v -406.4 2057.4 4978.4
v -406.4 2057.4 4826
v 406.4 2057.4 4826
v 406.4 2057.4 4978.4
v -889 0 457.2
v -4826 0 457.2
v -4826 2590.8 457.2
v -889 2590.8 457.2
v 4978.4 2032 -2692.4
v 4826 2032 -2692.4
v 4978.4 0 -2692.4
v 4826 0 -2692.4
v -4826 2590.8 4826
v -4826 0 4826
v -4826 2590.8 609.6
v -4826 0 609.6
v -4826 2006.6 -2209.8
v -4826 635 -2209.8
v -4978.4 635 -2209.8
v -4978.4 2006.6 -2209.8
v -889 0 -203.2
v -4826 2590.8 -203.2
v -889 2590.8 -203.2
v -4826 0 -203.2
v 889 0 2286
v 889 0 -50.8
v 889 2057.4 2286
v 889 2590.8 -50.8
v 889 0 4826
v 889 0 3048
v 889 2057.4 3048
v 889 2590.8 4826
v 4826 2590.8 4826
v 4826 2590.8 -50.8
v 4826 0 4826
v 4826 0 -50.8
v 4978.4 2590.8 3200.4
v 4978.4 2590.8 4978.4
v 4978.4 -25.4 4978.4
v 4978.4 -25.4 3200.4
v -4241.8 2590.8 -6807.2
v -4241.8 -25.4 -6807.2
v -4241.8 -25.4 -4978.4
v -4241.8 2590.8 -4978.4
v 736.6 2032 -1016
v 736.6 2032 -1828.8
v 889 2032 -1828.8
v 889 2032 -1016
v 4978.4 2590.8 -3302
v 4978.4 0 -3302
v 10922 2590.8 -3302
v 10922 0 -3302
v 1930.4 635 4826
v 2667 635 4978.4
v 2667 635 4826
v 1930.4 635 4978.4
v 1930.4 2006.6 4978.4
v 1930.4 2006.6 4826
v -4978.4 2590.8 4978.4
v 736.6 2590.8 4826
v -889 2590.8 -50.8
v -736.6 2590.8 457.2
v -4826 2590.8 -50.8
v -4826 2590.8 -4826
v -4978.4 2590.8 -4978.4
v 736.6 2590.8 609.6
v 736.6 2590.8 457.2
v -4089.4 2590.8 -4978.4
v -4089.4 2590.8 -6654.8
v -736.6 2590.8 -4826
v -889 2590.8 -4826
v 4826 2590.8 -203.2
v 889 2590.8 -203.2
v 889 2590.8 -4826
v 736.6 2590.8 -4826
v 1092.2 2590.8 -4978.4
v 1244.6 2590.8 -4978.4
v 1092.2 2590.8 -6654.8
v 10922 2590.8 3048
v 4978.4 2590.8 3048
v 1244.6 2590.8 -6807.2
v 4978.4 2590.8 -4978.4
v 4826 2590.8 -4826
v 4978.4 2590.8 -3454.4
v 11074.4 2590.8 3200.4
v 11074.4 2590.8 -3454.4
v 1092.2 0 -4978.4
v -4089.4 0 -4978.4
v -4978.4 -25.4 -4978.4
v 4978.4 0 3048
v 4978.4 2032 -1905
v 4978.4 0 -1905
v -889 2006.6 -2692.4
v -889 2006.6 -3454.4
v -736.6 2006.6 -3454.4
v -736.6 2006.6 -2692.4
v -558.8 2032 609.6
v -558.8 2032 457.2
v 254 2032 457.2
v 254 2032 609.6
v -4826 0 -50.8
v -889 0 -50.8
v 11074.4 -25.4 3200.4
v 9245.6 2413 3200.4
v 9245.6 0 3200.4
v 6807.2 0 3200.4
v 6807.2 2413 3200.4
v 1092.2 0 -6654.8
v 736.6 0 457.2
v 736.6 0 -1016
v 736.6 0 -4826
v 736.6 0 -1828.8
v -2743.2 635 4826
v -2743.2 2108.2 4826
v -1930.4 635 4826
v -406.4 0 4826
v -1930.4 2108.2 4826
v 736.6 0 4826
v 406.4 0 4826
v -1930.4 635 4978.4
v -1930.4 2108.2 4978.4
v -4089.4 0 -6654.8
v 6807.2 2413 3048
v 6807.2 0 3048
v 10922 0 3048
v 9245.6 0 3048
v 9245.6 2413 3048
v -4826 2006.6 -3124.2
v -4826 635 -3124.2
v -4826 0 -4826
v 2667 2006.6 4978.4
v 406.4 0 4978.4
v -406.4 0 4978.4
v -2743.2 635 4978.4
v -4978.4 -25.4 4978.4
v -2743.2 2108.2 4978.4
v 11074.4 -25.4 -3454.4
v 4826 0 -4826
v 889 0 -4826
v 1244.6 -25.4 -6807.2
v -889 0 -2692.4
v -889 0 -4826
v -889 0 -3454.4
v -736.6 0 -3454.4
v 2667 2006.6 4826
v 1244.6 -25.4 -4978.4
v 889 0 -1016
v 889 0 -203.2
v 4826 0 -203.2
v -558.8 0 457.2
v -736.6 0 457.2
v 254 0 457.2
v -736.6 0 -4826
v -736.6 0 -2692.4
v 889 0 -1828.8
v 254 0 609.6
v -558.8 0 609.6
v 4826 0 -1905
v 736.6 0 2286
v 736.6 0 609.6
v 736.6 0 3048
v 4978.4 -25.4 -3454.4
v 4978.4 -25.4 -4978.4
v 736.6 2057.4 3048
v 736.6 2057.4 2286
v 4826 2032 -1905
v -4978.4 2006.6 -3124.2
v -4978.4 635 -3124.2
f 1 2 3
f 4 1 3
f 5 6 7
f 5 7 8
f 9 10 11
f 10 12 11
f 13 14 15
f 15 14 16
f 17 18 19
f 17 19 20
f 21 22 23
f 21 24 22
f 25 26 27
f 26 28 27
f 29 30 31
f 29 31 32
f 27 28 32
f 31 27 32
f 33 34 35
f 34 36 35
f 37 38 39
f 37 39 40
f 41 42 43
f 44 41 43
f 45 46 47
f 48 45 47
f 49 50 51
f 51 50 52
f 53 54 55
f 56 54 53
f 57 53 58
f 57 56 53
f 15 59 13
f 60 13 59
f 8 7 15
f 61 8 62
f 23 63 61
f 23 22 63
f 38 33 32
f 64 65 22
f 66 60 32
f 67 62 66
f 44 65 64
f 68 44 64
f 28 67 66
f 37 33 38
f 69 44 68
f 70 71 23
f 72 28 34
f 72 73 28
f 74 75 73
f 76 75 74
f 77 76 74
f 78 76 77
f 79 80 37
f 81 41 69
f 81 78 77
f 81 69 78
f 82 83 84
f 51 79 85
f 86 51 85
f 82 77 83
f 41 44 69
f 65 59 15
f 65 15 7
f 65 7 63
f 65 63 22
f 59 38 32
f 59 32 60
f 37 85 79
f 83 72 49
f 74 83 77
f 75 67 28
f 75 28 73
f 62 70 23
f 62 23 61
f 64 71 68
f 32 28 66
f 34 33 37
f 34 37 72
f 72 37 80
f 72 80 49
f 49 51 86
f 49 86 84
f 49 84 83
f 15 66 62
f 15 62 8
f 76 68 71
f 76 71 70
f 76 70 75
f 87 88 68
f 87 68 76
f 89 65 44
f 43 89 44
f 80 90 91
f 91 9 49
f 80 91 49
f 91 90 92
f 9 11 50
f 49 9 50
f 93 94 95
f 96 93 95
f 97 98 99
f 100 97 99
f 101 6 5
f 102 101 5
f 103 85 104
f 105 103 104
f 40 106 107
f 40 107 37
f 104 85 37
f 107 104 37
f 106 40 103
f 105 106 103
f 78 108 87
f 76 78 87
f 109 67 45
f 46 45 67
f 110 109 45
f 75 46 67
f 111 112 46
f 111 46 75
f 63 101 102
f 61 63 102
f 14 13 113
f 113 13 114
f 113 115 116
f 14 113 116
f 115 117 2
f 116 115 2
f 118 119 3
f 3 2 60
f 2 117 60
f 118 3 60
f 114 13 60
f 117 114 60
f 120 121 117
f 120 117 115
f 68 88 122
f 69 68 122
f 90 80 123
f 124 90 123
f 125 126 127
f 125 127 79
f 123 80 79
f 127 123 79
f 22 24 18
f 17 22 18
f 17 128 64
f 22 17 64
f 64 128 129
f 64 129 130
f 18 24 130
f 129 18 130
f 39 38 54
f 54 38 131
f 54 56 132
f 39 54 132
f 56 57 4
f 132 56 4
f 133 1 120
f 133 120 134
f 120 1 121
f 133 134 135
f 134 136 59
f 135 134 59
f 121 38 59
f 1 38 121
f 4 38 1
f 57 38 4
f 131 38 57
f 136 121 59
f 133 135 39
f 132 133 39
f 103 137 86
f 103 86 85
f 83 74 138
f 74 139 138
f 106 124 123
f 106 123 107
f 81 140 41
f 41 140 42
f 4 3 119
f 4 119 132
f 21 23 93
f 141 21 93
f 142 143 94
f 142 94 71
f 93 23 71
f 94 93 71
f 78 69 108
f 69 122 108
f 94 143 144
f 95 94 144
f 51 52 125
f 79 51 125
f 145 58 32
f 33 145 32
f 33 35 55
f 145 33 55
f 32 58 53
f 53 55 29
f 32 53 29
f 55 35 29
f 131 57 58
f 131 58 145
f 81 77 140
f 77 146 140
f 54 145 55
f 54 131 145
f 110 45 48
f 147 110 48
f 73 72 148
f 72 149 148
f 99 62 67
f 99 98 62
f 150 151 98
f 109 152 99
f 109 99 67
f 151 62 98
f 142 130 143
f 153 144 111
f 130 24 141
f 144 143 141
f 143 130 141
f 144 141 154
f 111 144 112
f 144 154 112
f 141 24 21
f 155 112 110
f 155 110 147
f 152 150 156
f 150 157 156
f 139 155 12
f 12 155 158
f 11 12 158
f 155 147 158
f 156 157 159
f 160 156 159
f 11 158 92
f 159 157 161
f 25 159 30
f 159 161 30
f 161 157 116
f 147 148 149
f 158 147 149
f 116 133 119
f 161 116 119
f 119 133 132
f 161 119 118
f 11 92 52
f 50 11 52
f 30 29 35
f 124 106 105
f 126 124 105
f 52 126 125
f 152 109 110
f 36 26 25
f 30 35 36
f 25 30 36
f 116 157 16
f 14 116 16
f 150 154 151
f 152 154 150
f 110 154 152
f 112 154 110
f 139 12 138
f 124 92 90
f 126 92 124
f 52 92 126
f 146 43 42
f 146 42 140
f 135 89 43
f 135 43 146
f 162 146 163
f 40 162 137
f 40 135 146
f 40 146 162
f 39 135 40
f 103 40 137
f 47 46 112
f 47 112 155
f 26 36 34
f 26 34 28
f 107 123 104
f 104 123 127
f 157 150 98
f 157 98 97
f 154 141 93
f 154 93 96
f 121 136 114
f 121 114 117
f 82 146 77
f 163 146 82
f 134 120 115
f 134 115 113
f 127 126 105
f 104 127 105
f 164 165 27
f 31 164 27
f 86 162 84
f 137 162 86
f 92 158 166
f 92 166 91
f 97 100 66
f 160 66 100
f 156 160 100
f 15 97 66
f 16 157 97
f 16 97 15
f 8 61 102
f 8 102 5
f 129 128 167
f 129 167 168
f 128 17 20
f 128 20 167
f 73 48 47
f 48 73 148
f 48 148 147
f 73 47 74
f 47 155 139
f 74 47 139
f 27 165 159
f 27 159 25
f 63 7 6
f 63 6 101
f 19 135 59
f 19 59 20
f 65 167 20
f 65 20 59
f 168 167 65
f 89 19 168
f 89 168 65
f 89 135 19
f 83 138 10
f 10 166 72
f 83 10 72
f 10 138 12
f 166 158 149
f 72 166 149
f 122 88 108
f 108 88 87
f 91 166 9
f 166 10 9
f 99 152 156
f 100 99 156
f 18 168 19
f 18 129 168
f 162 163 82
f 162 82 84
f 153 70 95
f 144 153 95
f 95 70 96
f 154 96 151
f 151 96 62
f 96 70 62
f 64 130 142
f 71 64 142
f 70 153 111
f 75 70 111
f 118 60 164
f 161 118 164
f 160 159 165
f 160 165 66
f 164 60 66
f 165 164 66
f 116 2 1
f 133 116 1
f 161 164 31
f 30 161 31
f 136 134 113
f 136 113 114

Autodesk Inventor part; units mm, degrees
ref_plane "YZ Plane" through (0, 0, 0) normal (1, 0, 0) x (0, 1, 0)
ref_plane "XZ Plane" through (0, 0, 0) normal (0, 1, 0) x (-1, 0, 0)
ref_plane "XY Plane" through (0, 0, 0) normal (0, 0, 1) x (1, 0, 0)
sketch "Sketch1" plane through (0, 0, 0) normal (0, 1, 0) x (-1, 0, 0)
  line L0 (4978.4, 4978.4) -> (4978.4, -4978.4)
  line L1 (8188.96, 0) -> (-14284.96, 0) projected
  line L2 (0, -9164.32) -> (0, 7335.52) projected
  line L3 (-4978.4, -3454.4) -> (-11074.4, -3454.4)
  line L4 (-11074.4, -3454.4) -> (-11074.4, 3200.4)
  line L5 (-4978.4, -3302) -> (-10922, -3302)
  line L6 (-10922, -3302) -> (-10922, 3048)
  line L7 (4089.4, -4978.4) -> (-1092.2, -4978.4)
  line L8 (-1244.6, -4978.4) -> (-1244.6, -6807.2)
  line L9 (-1244.6, -6807.2) -> (4241.8, -6807.2)
  line L10 (4241.8, -6807.2) -> (4241.8, -4978.4)
  line L11 (4089.4, -6654.8) -> (-1092.2, -6654.8)
  line L12 (-1092.2, -6654.8) -> (-1092.2, -4978.4)
  line L13 (-1092.2, -4978.4) -> (4089.4, -4978.4)
  line L14 (4089.4, -4978.4) -> (4089.4, -6654.8)
  line L15 (-1244.6, -4978.4) -> (-4978.4, -4978.4)
  line L16 (4978.4, -4978.4) -> (4241.8, -4978.4)
  line L17 (4089.4, -4978.4) -> (-1092.2, -4978.4)
  line L18 (-4978.4, -4978.4) -> (-4978.4, -3454.4)
  line L19 (-4978.4, 3200.4) -> (-4978.4, 4978.4)
  line L20 (-6807.2, 3048) -> (-6807.2, 3200.4)
  line L21 (-9245.6, 3048) -> (-9245.6, 3200.4)
  line L22 (-10922, 3048) -> (-9245.6, 3048)
  line L23 (-6807.2, 3048) -> (-4978.4, 3048)
  line L24 (-11074.4, 3200.4) -> (-9245.6, 3200.4)
  line L25 (-6807.2, 3200.4) -> (-4978.4, 3200.4)
  line L26 (-406.4, 4826) -> (-406.4, 4978.4)
  line L27 (406.4, 4826) -> (406.4, 4978.4)
  line L28 (-4978.4, 4978.4) -> (-406.4, 4978.4)
  line L29 (406.4, 4978.4) -> (4978.4, 4978.4)
  line L30 (406.4, 4826) -> (4826, 4826)
  line L31 (4826, -203.2) -> (889, -203.2)
  line L32 (4826, -50.8) -> (889, -50.8)
  line L33 (-4826, -203.2) -> (-889, -203.2)
  line L34 (-4826, -50.8) -> (-889, -50.8)
  line L35 (-4826, -1905) -> (-4978.4, -1905)
  line L36 (-4826, -2692.4) -> (-4978.4, -2692.4)
  line L37 (-4978.4, 3048) -> (-4978.4, -1905)
  line L38 (-4978.4, -2692.4) -> (-4978.4, -3302)
  line L39 (-4978.4, 3048) -> (-4978.4, -1905)
  line L40 (-4978.4, -2692.4) -> (-4978.4, -3302)
  line L41 (-4826, -4826) -> (-4826, -2692.4)
  line L42 (-4978.4, -3302) -> (-4978.4, -2692.4)
  line L43 (-4978.4, -1905) -> (-4978.4, 3048)
  line L44 (-4826, -1905) -> (-4826, -203.2)
  line L45 (-4826, -50.8) -> (-4826, 4826)
  line L46 (-4826, 4826) -> (-889, 4826)
  line L47 (-736.6, 4826) -> (-406.4, 4826)
  line L48 (4826, -203.2) -> (4826, -4826)
  line L49 (4826, -4826) -> (889, -4826)
  line L50 (736.6, -4826) -> (-736.6, -4826)
  line L51 (-889, -4826) -> (-4826, -4826)
  line L52 (889, -2692.4) -> (736.6, -2692.4)
  line L53 (889, -3454.4) -> (736.6, -3454.4)
  line L54 (-736.6, -1016) -> (-889, -1016)
  line L55 (-736.6, -1828.8) -> (-889, -1828.8)
  line L56 (-254, 457.2) -> (-254, 609.6)
  line L57 (558.8, 609.6) -> (4826, 609.6)
  line L58 (736.6, -50.8) -> (736.6, 457.2)
  line L59 (889, -50.8) -> (889, 457.2)
  line L60 (-736.6, 3048) -> (-889, 3048)
  line L61 (-736.6, 2286) -> (-889, 2286)
  line L62 (558.8, 457.2) -> (558.8, 609.6)
  line L63 (-254, 609.6) -> (-736.6, 609.6)
  line L64 (-736.6, 457.2) -> (-254, 457.2)
  line L65 (-736.6, -50.8) -> (-736.6, 457.2)
  line L66 (4826, 457.2) -> (889, 457.2)
  line L67 (736.6, 457.2) -> (558.8, 457.2)
  line L68 (-736.6, 609.6) -> (-736.6, 2286)
  line L69 (-736.6, 3048) -> (-736.6, 4826)
  line L70 (-889, -50.8) -> (-889, 2286)
  line L71 (-889, 3048) -> (-889, 4826)
  line L72 (-736.6, -50.8) -> (-736.6, -1016)
  line L73 (-736.6, -1828.8) -> (-736.6, -4826)
  line L74 (-889, -203.2) -> (-889, -1016)
  line L75 (-889, -1828.8) -> (-889, -4826)
  line L76 (736.6, -50.8) -> (736.6, -2692.4)
  line L77 (736.6, -3454.4) -> (736.6, -4826)
  line L78 (889, -203.2) -> (889, -2692.4)
  line L79 (889, -3454.4) -> (889, -4826)
  line L80 (4826, 4826) -> (4826, 609.6)
  line L81 (4826, 457.2) -> (4826, -50.8)
  point P0 (0, 0)
  dimension "d8" = 152.4
  dimension "d9" = 152.4
  dimension "d12" = 736.6
  dimension "d14" = 152.4
  dimension "d15" = 152.4
  dimension "d16" = 152.4
  dimension "d17" = 1828.8
  dimension "d19" = 1524
  dimension "d22" = 9956.8
  dimension "d23" = 3733.8
  dimension "d24" = 1828.8
  dimension "d25" = 1828.8
  dimension "d26" = 6654.8
  dimension "d27" = 152.4
  dimension "d28" = 4572
  dimension "d29" = 812.8
  dimension "d30" = 9956.8
  dimension "d32" = 152.4
  dimension "d35" = 1701.8
  dimension "d36" = 2489.2
  dimension "d38" = 5486.4
  dimension "d40" = 152.4
  dimension "d41" = 4622.8
  dimension "d42" = 152.4
  dimension "d43" = 6096
  dimension "d44" = 2489.2
  dimension "d45" = 3251.2
  dimension "d48" = 812.8
  dimension "d49" = 812.8
  dimension "d52" = 1778
  dimension "d53" = 2540
  dimension "d57" = 812.8
  dimension "d59" = 152.4
  dimension "d60" = 152.4
  dimension "d61" = 152.4
  dimension "d62" = 5283.2
  dimension "d63" = 3937
  dimension "d64" = 4267.2
  dimension "d65" = 152.4
extrude "Extrusion1" add sketch "Sketch1" along normal blind 2590.8 contours L0 L1 L81 L66 L59 L58 L67 L62 L57 L80 L30 L27 L29 | L0 L16 L10 L9 L2 L11 L14 L7 L50 L77 L53 L79 L49 L48 L31 L78 L52 L76 L58 L1 L59 L32 L81 | L9 L8 L15 L18 L3 L4 L1 L6 L5 L38 L36 L41 L51 L75 L55 L73 L50 L2 L7 L12 L11 | L65 L72 L54 L74 L33 L44 L35 L37 L1 L45 L34 L70 | L1 L70 L61 L68 L63 L56 L64 L65 | L1 L37 L23 L20 L25 L19 L28 L26 L47 L69 L60 L71 L46 L45 | L1 L4 L24 L21 L22 L6
sketch "Sketch2" plane through (0, 0, 0) normal (0, -1, 0) x (1, 0, 0)
  line L0 (-4978.4, -4978.4) -> (-4978.4, 4978.4) projected
  line L1 (-4241.8, -4978.4) -> (-4978.4, -4978.4) projected
  line L2 (-4241.8, -6807.2) -> (-4241.8, -4978.4) projected
  line L3 (1244.6, -6807.2) -> (-4241.8, -6807.2) projected
  line L4 (1244.6, -4978.4) -> (1244.6, -6807.2) projected
  line L5 (4978.4, -4978.4) -> (1244.6, -4978.4) projected
  line L6 (4978.4, -3454.4) -> (4978.4, -4978.4) projected
  line L7 (11074.4, -3454.4) -> (4978.4, -3454.4) projected
  line L8 (11074.4, 3200.4) -> (11074.4, -3454.4) projected
  line L9 (9245.6, 3200.4) -> (11074.4, 3200.4) projected
  line L10 (9245.6, 3048) -> (9245.6, 3200.4) projected
  line L11 (10922, 3048) -> (9245.6, 3048) projected
  line L12 (10922, -3302) -> (10922, 3048) projected
  line L13 (4978.4, -3302) -> (10922, -3302) projected
  line L14 (4978.4, -2692.4) -> (4978.4, -3302) projected
  line L15 (4826, -2692.4) -> (4978.4, -2692.4) projected
  line L16 (4826, -4826) -> (4826, -2692.4) projected
  line L17 (889, -4826) -> (4826, -4826) projected
  line L18 (889, -1828.8) -> (889, -4826) projected
  line L19 (736.6, -1828.8) -> (889, -1828.8) projected
  line L20 (736.6, -4826) -> (736.6, -1828.8) projected
  line L21 (-736.6, -4826) -> (736.6, -4826) projected
  line L22 (-736.6, -3454.4) -> (-736.6, -4826) projected
  line L23 (-889, -3454.4) -> (-736.6, -3454.4) projected
  line L24 (-889, -4826) -> (-889, -3454.4) projected
  line L25 (-4826, -4826) -> (-889, -4826) projected
  line L26 (-4826, -203.2) -> (-4826, -4826) projected
  line L27 (-889, -203.2) -> (-4826, -203.2) projected
  line L28 (-889, -2692.4) -> (-889, -203.2) projected
  line L29 (-736.6, -2692.4) -> (-889, -2692.4) projected
  line L30 (-736.6, 457.2) -> (-736.6, -2692.4) projected
  line L31 (-558.8, 457.2) -> (-736.6, 457.2) projected
  line L32 (-558.8, 609.6) -> (-558.8, 457.2) projected
  line L33 (-4826, 609.6) -> (-558.8, 609.6) projected
  line L34 (-4826, 4826) -> (-4826, 609.6) projected
  line L35 (-406.4, 4826) -> (-4826, 4826) projected
  line L36 (-406.4, 4978.4) -> (-406.4, 4826) projected
  line L37 (-4978.4, 4978.4) -> (-406.4, 4978.4) projected
  line L38 (4978.4, 4978.4) -> (4978.4, 3200.4) projected
  line L39 (406.4, 4978.4) -> (4978.4, 4978.4) projected
  line L40 (406.4, 4826) -> (406.4, 4978.4) projected
  line L41 (736.6, 4826) -> (406.4, 4826) projected
  line L42 (736.6, 3048) -> (736.6, 4826) projected
  line L43 (889, 3048) -> (736.6, 3048) projected
  line L44 (889, 4826) -> (889, 3048) projected
  line L45 (4826, 4826) -> (889, 4826) projected
  line L46 (4826, -50.8) -> (4826, 4826) projected
  line L47 (889, -50.8) -> (4826, -50.8) projected
  line L48 (889, 2286) -> (889, -50.8) projected
  line L49 (736.6, 2286) -> (889, 2286) projected
  line L50 (736.6, 609.6) -> (736.6, 2286) projected
  line L51 (254, 609.6) -> (736.6, 609.6) projected
  line L52 (254, 457.2) -> (254, 609.6) projected
  line L53 (736.6, 457.2) -> (254, 457.2) projected
  line L54 (736.6, -1016) -> (736.6, 457.2) projected
  line L55 (889, -1016) -> (736.6, -1016) projected
  line L56 (889, -203.2) -> (889, -1016) projected
  line L57 (4826, -203.2) -> (889, -203.2) projected
  line L58 (4826, -1905) -> (4826, -203.2) projected
  line L59 (4978.4, -1905) -> (4826, -1905) projected
  line L60 (4978.4, 3048) -> (4978.4, -1905) projected
  line L61 (6807.2, 3048) -> (4978.4, 3048) projected
  line L62 (6807.2, 3200.4) -> (6807.2, 3048) projected
  line L63 (4978.4, 3200.4) -> (6807.2, 3200.4) projected
  line L64 (-4978.4, 4978.4) -> (4978.4, 4978.4)
  line L65 (4978.4, 4978.4) -> (4978.4, -4978.4)
  line L66 (4978.4, -4978.4) -> (-4978.4, -4978.4)
  line L67 (-4978.4, -4978.4) -> (-4978.4, 4978.4)
  line L68 (-4241.8, -4978.4) -> (1244.6, -4978.4)
  line L69 (1244.6, -4978.4) -> (1244.6, -6807.2)
  line L70 (1244.6, -6807.2) -> (-4241.8, -6807.2)
  line L71 (-4241.8, -6807.2) -> (-4241.8, -4978.4)
  line L72 (11074.4, 3200.4) -> (4978.4, 3200.4)
  line L73 (4978.4, 3200.4) -> (4978.4, -3454.4)
  line L74 (4978.4, -3454.4) -> (11074.4, -3454.4)
  line L75 (11074.4, -3454.4) -> (11074.4, 3200.4)
  point P0 (0, 0)
extrude "Extrusion2" add sketch "Sketch2" along normal blind 25.4
sketch "Sketch3" plane through (0, 2590.8, 0) normal (0, 1, 0) x (1, 0, 0)
  line L0 (6807.2, -3200.4) -> (6807.2, -3048) projected
  line L1 (9245.6, -3200.4) -> (6807.2, -3200.4) projected
  line L2 (9245.6, -3048) -> (9245.6, -3200.4) projected
  line L3 (10922, -3048) -> (9245.6, -3048) projected
  line L4 (10922, 3302) -> (10922, -3048) projected
  line L5 (4978.4, 3302) -> (10922, 3302) projected
  line L6 (4978.4, 2692.4) -> (4978.4, 3302) projected
  line L7 (4826, 2692.4) -> (4978.4, 2692.4) projected
  line L8 (4826, 4826) -> (4826, 2692.4) projected
  line L9 (889, 4826) -> (4826, 4826) projected
  line L10 (889, 1828.8) -> (889, 4826) projected
  line L11 (736.6, 1828.8) -> (889, 1828.8) projected
  line L12 (736.6, 4826) -> (736.6, 1828.8) projected
  line L13 (-736.6, 4826) -> (736.6, 4826) projected
  line L14 (-736.6, 3454.4) -> (-736.6, 4826) projected
  line L15 (-889, 3454.4) -> (-736.6, 3454.4) projected
  line L16 (-889, 4826) -> (-889, 3454.4) projected
  line L17 (-4826, 4826) -> (-889, 4826) projected
  line L18 (-4826, 203.2) -> (-4826, 4826) projected
  line L19 (-889, 203.2) -> (-4826, 203.2) projected
  line L20 (-889, 2692.4) -> (-889, 203.2) projected
  line L21 (-736.6, 2692.4) -> (-889, 2692.4) projected
  line L22 (-736.6, -457.2) -> (-736.6, 2692.4) projected
  line L23 (-558.8, -457.2) -> (-736.6, -457.2) projected
  line L24 (-558.8, -609.6) -> (-558.8, -457.2) projected
  line L25 (-4826, -609.6) -> (-558.8, -609.6) projected
  line L26 (-4826, -4826) -> (-4826, -609.6) projected
  line L27 (-406.4, -4826) -> (-4826, -4826) projected
  line L28 (-406.4, -4978.4) -> (-406.4, -4826) projected
  line L29 (406.4, -4978.4) -> (-406.4, -4978.4) projected
  line L30 (406.4, -4826) -> (406.4, -4978.4) projected
  line L31 (736.6, -4826) -> (406.4, -4826) projected
  line L32 (736.6, -3048) -> (736.6, -4826) projected
  line L33 (889, -3048) -> (736.6, -3048) projected
  line L34 (889, -4826) -> (889, -3048) projected
  line L35 (4826, -4826) -> (889, -4826) projected
  line L36 (4826, 50.8) -> (4826, -4826) projected
  line L37 (889, 50.8) -> (4826, 50.8) projected
  line L38 (889, -2286) -> (889, 50.8) projected
  line L39 (736.6, -2286) -> (889, -2286) projected
  line L40 (736.6, -609.6) -> (736.6, -2286) projected
  line L41 (254, -609.6) -> (736.6, -609.6) projected
  line L42 (254, -457.2) -> (254, -609.6) projected
  line L43 (736.6, -457.2) -> (254, -457.2) projected
  line L44 (736.6, 1016) -> (736.6, -457.2) projected
  line L45 (889, 1016) -> (736.6, 1016) projected
  line L46 (889, 203.2) -> (889, 1016) projected
  line L47 (4826, 203.2) -> (889, 203.2) projected
  line L48 (4826, 1905) -> (4826, 203.2) projected
  line L49 (4978.4, 1905) -> (4826, 1905) projected
  line L50 (4978.4, -3048) -> (4978.4, 1905) projected
  line L51 (6807.2, -3048) -> (4978.4, -3048) projected
  line L52 (-406.4, -4826) -> (406.4, -4826)
  line L53 (406.4, -4826) -> (406.4, -4978.4)
  line L54 (406.4, -4978.4) -> (-406.4, -4978.4)
  line L55 (-406.4, -4978.4) -> (-406.4, -4826)
  line L56 (736.6, -2286) -> (889, -2286)
  line L57 (889, -2286) -> (889, -3048)
  line L58 (889, -3048) -> (736.6, -3048)
  line L59 (736.6, -3048) -> (736.6, -2286)
  line L60 (-558.8, -457.2) -> (254, -457.2)
  line L61 (254, -457.2) -> (254, -609.6)
  line L62 (254, -609.6) -> (-558.8, -609.6)
  line L63 (-558.8, -609.6) -> (-558.8, -457.2)
  line L64 (736.6, 1828.8) -> (889, 1828.8)
  line L65 (889, 1828.8) -> (889, 1016)
  line L66 (889, 1016) -> (736.6, 1016)
  line L67 (736.6, 1016) -> (736.6, 1828.8)
  line L68 (-889, 3454.4) -> (-736.6, 3454.4)
  line L69 (-736.6, 3454.4) -> (-736.6, 2692.4)
  line L70 (-736.6, 2692.4) -> (-889, 2692.4)
  line L71 (-889, 2692.4) -> (-889, 3454.4)
  line L72 (4826, 2692.4) -> (4978.4, 2692.4)
  line L73 (4978.4, 2692.4) -> (4978.4, 1905)
  line L74 (4978.4, 1905) -> (4826, 1905)
  line L75 (4826, 1905) -> (4826, 2692.4)
  line L76 (6807.2, -3048) -> (9245.6, -3048)
  line L77 (9245.6, -3048) -> (9245.6, -3200.4)
  line L78 (9245.6, -3200.4) -> (6807.2, -3200.4)
  line L79 (6807.2, -3200.4) -> (6807.2, -3048)
  point P0 (0, 0)
extrude "Extrusion3" add sketch "Sketch3" against normal blind 558.8 contours L49 L75 L7 L73 | L45 L67 L11 L65 | L42 L62 L24 L60
extrude "Extrusion4" add sketch "Sketch3" against normal blind 533.4 contours L39 L57 L33 L59
extrude "Extrusion5" add sketch "Sketch3" against normal blind 584.2 contours L69 L21 L71 L15
extrude "Extrusion6" add sketch "Sketch3" against normal blind 177.8 contours L0 L76 L2 L1
extrude "Extrusion7" add sketch "Sketch3" against normal blind 533.4 contours L52 L30 L29 L28
sketch "Sketch4" plane through (-4978.4, 2590.8, 4978.4) normal (0, 0, 1) x (1, 0, 0)
  line L0 (0, 0) -> (9956.8, 0) projected
  line L1 (0, -2616.2) -> (0, 0) projected
  line L2 (9956.8, 0) -> (9956.8, -2616.2) projected
  line L3 (4572, -2590.8) -> (152.4, -2590.8) projected
  line L4 (9804.4, -2590.8) -> (5867.4, -2590.8) projected
  line L5 (2235.2, -482.6) -> (3048, -482.6)
  line L6 (3048, -482.6) -> (3048, -1955.8)
  line L7 (3048, -1955.8) -> (2235.2, -1955.8)
  line L8 (2235.2, -1955.8) -> (2235.2, -482.6)
  line L9 (6908.8, -584.2) -> (7645.4, -584.2)
  line L10 (7645.4, -584.2) -> (7645.4, -1955.8)
  line L11 (7645.4, -1955.8) -> (6908.8, -1955.8)
  line L12 (6908.8, -1955.8) -> (6908.8, -584.2)
  point P0 (4978.4, -2590.8)
  dimension "d80" = 482.6
  dimension "d81" = 635
  dimension "d82" = 2235.2
  dimension "d83" = 812.8
  dimension "d84" = 635
  dimension "d85" = 584.2
  dimension "d86" = 2311.4
  dimension "d87" = 736.6
extrude "Extrusion8" cut sketch "Sketch4" against normal up to surface (152.4 mm away)
sketch "Sketch6" plane through (-4826, 2590.8, -203.2) normal (1, 0, 0) x (0, 0, -1)
  line L0 (0, -2590.8) -> (4622.8, -2590.8) projected
  line L1 (0, -2590.8) -> (0, 0) projected
  line L2 (2006.6, -584.2) -> (2921, -584.2)
  line L3 (2921, -584.2) -> (2921, -1955.8)
  line L4 (2921, -1955.8) -> (2006.6, -1955.8)
  line L5 (2006.6, -1955.8) -> (2006.6, -584.2)
  point P0 (-203.2, -2590.8)
  dimension "d97" = 914.4
  dimension "d98" = 1371.6
  dimension "d99" = 635
  dimension "d100" = 2006.6
extrude "Extrusion10" cut sketch "Sketch6" against normal up to surface (152.4 mm away)
properties part number "305 Manning"
